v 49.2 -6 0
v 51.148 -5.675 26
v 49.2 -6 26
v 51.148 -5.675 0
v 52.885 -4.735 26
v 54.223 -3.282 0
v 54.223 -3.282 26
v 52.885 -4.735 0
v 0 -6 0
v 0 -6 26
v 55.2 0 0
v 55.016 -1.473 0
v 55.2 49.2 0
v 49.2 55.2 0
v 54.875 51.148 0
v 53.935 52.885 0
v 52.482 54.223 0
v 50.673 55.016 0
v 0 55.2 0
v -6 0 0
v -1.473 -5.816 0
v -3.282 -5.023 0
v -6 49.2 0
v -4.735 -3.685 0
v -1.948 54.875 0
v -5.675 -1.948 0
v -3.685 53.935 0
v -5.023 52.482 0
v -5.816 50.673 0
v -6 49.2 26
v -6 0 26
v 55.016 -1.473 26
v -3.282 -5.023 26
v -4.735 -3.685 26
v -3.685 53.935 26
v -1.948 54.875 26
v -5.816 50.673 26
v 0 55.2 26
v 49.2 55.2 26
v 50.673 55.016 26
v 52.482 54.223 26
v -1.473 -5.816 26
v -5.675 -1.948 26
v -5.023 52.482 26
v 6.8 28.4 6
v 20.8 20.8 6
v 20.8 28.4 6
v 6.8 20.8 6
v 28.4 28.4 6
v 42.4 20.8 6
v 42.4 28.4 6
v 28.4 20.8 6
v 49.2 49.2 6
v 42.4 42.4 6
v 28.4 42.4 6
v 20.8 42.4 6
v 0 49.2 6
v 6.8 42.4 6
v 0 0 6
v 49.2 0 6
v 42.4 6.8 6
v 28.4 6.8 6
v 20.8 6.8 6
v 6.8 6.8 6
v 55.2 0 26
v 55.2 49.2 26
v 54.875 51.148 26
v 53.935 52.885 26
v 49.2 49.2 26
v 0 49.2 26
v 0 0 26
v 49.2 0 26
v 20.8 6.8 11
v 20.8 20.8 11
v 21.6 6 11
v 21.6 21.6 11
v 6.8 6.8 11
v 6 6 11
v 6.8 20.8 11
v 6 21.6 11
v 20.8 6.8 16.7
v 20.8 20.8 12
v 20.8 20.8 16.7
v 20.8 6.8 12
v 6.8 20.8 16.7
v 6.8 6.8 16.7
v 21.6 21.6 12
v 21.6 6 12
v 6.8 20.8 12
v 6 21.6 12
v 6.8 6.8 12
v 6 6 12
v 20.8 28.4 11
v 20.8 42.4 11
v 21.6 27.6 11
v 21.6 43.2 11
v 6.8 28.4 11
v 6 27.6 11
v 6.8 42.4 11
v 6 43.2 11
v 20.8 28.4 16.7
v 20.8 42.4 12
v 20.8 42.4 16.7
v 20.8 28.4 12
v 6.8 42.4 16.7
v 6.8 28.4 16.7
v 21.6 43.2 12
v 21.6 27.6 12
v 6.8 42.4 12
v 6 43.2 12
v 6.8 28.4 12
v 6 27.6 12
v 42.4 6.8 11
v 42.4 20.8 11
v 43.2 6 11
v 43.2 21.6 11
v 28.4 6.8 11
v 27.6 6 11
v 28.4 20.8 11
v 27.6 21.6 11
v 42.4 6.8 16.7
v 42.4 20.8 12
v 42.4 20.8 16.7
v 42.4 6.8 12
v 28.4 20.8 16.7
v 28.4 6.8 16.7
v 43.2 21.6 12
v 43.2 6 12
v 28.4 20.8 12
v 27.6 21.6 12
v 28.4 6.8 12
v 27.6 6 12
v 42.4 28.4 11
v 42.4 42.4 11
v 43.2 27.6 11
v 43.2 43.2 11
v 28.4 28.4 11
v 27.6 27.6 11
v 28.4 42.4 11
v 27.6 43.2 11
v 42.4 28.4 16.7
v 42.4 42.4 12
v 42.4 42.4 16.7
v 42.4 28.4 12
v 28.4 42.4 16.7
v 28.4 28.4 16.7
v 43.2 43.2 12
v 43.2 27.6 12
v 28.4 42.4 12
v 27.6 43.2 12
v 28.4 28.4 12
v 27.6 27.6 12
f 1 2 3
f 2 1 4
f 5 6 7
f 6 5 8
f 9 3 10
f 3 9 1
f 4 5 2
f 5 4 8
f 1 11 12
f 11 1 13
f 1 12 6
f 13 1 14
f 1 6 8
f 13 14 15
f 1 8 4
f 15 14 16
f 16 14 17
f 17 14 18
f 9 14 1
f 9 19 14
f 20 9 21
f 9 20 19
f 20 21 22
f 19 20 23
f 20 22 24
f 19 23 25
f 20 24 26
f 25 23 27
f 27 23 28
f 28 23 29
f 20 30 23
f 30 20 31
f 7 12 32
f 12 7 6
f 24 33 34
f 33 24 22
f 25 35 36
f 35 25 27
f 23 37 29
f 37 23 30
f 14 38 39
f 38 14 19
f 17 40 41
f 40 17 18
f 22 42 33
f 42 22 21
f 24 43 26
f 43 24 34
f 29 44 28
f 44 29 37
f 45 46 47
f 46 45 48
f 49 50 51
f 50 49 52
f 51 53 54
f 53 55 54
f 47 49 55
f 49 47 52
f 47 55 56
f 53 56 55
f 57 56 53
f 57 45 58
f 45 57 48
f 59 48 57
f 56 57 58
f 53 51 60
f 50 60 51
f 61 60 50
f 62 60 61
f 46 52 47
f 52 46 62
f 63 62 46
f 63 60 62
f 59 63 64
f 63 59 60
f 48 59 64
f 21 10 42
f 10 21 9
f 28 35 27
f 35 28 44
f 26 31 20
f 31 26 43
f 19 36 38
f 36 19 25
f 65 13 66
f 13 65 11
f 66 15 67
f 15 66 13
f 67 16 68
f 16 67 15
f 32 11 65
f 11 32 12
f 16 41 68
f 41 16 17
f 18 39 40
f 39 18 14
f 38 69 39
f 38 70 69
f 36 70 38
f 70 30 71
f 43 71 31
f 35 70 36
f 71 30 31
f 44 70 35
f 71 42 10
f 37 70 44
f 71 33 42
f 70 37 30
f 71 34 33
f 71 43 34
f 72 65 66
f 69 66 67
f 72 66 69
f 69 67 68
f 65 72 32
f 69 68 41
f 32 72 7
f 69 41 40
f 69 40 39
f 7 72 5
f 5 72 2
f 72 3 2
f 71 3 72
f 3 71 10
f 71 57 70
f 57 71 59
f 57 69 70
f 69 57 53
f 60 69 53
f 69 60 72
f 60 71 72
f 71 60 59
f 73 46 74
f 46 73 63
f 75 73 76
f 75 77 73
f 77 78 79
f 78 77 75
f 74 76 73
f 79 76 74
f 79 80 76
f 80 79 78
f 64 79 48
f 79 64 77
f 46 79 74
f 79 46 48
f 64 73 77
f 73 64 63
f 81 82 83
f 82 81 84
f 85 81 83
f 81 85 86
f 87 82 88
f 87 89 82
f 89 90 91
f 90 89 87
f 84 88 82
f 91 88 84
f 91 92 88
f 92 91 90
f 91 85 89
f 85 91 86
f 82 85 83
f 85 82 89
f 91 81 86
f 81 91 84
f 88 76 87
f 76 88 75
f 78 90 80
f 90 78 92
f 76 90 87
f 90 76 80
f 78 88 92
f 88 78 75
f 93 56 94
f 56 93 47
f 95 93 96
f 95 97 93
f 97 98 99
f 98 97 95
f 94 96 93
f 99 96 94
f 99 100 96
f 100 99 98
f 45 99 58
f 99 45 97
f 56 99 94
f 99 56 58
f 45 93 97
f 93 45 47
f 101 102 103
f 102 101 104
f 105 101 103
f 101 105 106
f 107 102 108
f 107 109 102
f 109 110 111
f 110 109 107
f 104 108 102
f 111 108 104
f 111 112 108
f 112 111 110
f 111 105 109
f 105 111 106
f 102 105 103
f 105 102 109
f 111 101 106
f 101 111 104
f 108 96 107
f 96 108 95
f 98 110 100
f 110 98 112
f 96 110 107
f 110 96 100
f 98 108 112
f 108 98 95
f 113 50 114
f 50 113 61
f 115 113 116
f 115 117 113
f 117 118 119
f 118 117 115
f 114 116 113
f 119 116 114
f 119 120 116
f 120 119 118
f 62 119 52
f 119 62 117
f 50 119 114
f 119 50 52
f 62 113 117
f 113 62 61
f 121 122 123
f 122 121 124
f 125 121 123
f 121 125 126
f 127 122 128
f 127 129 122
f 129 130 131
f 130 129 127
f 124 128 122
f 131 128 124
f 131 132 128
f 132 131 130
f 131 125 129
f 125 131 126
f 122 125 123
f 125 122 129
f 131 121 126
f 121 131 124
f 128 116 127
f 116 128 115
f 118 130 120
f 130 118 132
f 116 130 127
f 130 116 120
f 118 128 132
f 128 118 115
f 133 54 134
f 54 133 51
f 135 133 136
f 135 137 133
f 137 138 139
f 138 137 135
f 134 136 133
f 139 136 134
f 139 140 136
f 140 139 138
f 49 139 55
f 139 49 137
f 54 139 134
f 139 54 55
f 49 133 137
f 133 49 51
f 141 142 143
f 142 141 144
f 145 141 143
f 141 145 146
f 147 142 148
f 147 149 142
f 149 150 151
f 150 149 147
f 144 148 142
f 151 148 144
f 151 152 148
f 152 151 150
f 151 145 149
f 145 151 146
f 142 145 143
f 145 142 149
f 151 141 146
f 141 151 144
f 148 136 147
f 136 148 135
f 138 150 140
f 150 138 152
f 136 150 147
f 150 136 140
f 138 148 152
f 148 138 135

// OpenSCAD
switchBaseSize = 14;
switchBaseHeight = 5;
switchTopHeight = 4.7;
switchSkirtHeight = 1;
switchSkirtOffset = 1.6;
switchSpacing = 6;
switchTotalWidth = switchBaseSize + switchSkirtOffset;

switchesWide = 2;
switchesTall = 2;

baseThickness = 6;
baseHeight = 15;

module switchBase() {
    translate([switchSkirtOffset / 2, switchSkirtOffset / 2, 0])
    
    color("black")
    cube([
    switchBaseSize,
    switchBaseSize, 
    switchBaseHeight], false);
    
    color("blue")
    translate([switchSkirtOffset / 2, switchSkirtOffset / 2,switchBaseHeight+switchSkirtHeight])
    cube([
    switchBaseSize, 
    switchBaseSize, 
    switchTopHeight], false);

    color("white")
    translate([0,0,switchBaseHeight])
    cube([
    switchBaseSize+switchSkirtOffset, 
    switchBaseSize+switchSkirtOffset, 
    switchSkirtHeight], false);
}

module switches() {    
    //translate([baseThickness, baseThickness, baseThickness+8])
    for (x = [0: switchesWide-1]) {
        for (y = [0: switchesTall-1]) {
            translate([
                (x * switchTotalWidth) + ((x + 1) * switchSpacing),
                (y * switchTotalWidth) + ((y + 1) * switchSpacing),
                baseThickness
            ])
            switchBase();
        }
    }
        
}

module macroBase() {
    switchesWidth = switchesWide * switchTotalWidth;
    switchesLength = switchesTall * switchTotalWidth;
    
    offsetWidth = ((switchesWide+1) * switchSpacing);
    offsetLength = ((switchesTall+1) * switchSpacing);
    
    // Bottom of macroHolder
    color("cyan")
    linear_extrude(height=baseThickness) {
        offset(r=baseThickness) {
            square([
                switchesWidth + offsetWidth,
                switchesLength + offsetLength,
            ], false);
        }
    }
    
    // Move off of base
    translate([0,0, baseThickness])
    // Walls of macroholder
    linear_extrude(height=baseHeight + switchBaseHeight){
        difference() {
        offset(r=baseThickness) {
            square([
                switchesWidth + offsetWidth,
                switchesLength + offsetLength,
            ], false);
        }
        square([
                switchesWidth + offsetWidth,
                switchesLength + offsetLength,
            ], false);
        }
    }
    
    // Cable Hole
    
}

//translate([baseThickness, baseThickness, 0])
macroBase();
switches();
